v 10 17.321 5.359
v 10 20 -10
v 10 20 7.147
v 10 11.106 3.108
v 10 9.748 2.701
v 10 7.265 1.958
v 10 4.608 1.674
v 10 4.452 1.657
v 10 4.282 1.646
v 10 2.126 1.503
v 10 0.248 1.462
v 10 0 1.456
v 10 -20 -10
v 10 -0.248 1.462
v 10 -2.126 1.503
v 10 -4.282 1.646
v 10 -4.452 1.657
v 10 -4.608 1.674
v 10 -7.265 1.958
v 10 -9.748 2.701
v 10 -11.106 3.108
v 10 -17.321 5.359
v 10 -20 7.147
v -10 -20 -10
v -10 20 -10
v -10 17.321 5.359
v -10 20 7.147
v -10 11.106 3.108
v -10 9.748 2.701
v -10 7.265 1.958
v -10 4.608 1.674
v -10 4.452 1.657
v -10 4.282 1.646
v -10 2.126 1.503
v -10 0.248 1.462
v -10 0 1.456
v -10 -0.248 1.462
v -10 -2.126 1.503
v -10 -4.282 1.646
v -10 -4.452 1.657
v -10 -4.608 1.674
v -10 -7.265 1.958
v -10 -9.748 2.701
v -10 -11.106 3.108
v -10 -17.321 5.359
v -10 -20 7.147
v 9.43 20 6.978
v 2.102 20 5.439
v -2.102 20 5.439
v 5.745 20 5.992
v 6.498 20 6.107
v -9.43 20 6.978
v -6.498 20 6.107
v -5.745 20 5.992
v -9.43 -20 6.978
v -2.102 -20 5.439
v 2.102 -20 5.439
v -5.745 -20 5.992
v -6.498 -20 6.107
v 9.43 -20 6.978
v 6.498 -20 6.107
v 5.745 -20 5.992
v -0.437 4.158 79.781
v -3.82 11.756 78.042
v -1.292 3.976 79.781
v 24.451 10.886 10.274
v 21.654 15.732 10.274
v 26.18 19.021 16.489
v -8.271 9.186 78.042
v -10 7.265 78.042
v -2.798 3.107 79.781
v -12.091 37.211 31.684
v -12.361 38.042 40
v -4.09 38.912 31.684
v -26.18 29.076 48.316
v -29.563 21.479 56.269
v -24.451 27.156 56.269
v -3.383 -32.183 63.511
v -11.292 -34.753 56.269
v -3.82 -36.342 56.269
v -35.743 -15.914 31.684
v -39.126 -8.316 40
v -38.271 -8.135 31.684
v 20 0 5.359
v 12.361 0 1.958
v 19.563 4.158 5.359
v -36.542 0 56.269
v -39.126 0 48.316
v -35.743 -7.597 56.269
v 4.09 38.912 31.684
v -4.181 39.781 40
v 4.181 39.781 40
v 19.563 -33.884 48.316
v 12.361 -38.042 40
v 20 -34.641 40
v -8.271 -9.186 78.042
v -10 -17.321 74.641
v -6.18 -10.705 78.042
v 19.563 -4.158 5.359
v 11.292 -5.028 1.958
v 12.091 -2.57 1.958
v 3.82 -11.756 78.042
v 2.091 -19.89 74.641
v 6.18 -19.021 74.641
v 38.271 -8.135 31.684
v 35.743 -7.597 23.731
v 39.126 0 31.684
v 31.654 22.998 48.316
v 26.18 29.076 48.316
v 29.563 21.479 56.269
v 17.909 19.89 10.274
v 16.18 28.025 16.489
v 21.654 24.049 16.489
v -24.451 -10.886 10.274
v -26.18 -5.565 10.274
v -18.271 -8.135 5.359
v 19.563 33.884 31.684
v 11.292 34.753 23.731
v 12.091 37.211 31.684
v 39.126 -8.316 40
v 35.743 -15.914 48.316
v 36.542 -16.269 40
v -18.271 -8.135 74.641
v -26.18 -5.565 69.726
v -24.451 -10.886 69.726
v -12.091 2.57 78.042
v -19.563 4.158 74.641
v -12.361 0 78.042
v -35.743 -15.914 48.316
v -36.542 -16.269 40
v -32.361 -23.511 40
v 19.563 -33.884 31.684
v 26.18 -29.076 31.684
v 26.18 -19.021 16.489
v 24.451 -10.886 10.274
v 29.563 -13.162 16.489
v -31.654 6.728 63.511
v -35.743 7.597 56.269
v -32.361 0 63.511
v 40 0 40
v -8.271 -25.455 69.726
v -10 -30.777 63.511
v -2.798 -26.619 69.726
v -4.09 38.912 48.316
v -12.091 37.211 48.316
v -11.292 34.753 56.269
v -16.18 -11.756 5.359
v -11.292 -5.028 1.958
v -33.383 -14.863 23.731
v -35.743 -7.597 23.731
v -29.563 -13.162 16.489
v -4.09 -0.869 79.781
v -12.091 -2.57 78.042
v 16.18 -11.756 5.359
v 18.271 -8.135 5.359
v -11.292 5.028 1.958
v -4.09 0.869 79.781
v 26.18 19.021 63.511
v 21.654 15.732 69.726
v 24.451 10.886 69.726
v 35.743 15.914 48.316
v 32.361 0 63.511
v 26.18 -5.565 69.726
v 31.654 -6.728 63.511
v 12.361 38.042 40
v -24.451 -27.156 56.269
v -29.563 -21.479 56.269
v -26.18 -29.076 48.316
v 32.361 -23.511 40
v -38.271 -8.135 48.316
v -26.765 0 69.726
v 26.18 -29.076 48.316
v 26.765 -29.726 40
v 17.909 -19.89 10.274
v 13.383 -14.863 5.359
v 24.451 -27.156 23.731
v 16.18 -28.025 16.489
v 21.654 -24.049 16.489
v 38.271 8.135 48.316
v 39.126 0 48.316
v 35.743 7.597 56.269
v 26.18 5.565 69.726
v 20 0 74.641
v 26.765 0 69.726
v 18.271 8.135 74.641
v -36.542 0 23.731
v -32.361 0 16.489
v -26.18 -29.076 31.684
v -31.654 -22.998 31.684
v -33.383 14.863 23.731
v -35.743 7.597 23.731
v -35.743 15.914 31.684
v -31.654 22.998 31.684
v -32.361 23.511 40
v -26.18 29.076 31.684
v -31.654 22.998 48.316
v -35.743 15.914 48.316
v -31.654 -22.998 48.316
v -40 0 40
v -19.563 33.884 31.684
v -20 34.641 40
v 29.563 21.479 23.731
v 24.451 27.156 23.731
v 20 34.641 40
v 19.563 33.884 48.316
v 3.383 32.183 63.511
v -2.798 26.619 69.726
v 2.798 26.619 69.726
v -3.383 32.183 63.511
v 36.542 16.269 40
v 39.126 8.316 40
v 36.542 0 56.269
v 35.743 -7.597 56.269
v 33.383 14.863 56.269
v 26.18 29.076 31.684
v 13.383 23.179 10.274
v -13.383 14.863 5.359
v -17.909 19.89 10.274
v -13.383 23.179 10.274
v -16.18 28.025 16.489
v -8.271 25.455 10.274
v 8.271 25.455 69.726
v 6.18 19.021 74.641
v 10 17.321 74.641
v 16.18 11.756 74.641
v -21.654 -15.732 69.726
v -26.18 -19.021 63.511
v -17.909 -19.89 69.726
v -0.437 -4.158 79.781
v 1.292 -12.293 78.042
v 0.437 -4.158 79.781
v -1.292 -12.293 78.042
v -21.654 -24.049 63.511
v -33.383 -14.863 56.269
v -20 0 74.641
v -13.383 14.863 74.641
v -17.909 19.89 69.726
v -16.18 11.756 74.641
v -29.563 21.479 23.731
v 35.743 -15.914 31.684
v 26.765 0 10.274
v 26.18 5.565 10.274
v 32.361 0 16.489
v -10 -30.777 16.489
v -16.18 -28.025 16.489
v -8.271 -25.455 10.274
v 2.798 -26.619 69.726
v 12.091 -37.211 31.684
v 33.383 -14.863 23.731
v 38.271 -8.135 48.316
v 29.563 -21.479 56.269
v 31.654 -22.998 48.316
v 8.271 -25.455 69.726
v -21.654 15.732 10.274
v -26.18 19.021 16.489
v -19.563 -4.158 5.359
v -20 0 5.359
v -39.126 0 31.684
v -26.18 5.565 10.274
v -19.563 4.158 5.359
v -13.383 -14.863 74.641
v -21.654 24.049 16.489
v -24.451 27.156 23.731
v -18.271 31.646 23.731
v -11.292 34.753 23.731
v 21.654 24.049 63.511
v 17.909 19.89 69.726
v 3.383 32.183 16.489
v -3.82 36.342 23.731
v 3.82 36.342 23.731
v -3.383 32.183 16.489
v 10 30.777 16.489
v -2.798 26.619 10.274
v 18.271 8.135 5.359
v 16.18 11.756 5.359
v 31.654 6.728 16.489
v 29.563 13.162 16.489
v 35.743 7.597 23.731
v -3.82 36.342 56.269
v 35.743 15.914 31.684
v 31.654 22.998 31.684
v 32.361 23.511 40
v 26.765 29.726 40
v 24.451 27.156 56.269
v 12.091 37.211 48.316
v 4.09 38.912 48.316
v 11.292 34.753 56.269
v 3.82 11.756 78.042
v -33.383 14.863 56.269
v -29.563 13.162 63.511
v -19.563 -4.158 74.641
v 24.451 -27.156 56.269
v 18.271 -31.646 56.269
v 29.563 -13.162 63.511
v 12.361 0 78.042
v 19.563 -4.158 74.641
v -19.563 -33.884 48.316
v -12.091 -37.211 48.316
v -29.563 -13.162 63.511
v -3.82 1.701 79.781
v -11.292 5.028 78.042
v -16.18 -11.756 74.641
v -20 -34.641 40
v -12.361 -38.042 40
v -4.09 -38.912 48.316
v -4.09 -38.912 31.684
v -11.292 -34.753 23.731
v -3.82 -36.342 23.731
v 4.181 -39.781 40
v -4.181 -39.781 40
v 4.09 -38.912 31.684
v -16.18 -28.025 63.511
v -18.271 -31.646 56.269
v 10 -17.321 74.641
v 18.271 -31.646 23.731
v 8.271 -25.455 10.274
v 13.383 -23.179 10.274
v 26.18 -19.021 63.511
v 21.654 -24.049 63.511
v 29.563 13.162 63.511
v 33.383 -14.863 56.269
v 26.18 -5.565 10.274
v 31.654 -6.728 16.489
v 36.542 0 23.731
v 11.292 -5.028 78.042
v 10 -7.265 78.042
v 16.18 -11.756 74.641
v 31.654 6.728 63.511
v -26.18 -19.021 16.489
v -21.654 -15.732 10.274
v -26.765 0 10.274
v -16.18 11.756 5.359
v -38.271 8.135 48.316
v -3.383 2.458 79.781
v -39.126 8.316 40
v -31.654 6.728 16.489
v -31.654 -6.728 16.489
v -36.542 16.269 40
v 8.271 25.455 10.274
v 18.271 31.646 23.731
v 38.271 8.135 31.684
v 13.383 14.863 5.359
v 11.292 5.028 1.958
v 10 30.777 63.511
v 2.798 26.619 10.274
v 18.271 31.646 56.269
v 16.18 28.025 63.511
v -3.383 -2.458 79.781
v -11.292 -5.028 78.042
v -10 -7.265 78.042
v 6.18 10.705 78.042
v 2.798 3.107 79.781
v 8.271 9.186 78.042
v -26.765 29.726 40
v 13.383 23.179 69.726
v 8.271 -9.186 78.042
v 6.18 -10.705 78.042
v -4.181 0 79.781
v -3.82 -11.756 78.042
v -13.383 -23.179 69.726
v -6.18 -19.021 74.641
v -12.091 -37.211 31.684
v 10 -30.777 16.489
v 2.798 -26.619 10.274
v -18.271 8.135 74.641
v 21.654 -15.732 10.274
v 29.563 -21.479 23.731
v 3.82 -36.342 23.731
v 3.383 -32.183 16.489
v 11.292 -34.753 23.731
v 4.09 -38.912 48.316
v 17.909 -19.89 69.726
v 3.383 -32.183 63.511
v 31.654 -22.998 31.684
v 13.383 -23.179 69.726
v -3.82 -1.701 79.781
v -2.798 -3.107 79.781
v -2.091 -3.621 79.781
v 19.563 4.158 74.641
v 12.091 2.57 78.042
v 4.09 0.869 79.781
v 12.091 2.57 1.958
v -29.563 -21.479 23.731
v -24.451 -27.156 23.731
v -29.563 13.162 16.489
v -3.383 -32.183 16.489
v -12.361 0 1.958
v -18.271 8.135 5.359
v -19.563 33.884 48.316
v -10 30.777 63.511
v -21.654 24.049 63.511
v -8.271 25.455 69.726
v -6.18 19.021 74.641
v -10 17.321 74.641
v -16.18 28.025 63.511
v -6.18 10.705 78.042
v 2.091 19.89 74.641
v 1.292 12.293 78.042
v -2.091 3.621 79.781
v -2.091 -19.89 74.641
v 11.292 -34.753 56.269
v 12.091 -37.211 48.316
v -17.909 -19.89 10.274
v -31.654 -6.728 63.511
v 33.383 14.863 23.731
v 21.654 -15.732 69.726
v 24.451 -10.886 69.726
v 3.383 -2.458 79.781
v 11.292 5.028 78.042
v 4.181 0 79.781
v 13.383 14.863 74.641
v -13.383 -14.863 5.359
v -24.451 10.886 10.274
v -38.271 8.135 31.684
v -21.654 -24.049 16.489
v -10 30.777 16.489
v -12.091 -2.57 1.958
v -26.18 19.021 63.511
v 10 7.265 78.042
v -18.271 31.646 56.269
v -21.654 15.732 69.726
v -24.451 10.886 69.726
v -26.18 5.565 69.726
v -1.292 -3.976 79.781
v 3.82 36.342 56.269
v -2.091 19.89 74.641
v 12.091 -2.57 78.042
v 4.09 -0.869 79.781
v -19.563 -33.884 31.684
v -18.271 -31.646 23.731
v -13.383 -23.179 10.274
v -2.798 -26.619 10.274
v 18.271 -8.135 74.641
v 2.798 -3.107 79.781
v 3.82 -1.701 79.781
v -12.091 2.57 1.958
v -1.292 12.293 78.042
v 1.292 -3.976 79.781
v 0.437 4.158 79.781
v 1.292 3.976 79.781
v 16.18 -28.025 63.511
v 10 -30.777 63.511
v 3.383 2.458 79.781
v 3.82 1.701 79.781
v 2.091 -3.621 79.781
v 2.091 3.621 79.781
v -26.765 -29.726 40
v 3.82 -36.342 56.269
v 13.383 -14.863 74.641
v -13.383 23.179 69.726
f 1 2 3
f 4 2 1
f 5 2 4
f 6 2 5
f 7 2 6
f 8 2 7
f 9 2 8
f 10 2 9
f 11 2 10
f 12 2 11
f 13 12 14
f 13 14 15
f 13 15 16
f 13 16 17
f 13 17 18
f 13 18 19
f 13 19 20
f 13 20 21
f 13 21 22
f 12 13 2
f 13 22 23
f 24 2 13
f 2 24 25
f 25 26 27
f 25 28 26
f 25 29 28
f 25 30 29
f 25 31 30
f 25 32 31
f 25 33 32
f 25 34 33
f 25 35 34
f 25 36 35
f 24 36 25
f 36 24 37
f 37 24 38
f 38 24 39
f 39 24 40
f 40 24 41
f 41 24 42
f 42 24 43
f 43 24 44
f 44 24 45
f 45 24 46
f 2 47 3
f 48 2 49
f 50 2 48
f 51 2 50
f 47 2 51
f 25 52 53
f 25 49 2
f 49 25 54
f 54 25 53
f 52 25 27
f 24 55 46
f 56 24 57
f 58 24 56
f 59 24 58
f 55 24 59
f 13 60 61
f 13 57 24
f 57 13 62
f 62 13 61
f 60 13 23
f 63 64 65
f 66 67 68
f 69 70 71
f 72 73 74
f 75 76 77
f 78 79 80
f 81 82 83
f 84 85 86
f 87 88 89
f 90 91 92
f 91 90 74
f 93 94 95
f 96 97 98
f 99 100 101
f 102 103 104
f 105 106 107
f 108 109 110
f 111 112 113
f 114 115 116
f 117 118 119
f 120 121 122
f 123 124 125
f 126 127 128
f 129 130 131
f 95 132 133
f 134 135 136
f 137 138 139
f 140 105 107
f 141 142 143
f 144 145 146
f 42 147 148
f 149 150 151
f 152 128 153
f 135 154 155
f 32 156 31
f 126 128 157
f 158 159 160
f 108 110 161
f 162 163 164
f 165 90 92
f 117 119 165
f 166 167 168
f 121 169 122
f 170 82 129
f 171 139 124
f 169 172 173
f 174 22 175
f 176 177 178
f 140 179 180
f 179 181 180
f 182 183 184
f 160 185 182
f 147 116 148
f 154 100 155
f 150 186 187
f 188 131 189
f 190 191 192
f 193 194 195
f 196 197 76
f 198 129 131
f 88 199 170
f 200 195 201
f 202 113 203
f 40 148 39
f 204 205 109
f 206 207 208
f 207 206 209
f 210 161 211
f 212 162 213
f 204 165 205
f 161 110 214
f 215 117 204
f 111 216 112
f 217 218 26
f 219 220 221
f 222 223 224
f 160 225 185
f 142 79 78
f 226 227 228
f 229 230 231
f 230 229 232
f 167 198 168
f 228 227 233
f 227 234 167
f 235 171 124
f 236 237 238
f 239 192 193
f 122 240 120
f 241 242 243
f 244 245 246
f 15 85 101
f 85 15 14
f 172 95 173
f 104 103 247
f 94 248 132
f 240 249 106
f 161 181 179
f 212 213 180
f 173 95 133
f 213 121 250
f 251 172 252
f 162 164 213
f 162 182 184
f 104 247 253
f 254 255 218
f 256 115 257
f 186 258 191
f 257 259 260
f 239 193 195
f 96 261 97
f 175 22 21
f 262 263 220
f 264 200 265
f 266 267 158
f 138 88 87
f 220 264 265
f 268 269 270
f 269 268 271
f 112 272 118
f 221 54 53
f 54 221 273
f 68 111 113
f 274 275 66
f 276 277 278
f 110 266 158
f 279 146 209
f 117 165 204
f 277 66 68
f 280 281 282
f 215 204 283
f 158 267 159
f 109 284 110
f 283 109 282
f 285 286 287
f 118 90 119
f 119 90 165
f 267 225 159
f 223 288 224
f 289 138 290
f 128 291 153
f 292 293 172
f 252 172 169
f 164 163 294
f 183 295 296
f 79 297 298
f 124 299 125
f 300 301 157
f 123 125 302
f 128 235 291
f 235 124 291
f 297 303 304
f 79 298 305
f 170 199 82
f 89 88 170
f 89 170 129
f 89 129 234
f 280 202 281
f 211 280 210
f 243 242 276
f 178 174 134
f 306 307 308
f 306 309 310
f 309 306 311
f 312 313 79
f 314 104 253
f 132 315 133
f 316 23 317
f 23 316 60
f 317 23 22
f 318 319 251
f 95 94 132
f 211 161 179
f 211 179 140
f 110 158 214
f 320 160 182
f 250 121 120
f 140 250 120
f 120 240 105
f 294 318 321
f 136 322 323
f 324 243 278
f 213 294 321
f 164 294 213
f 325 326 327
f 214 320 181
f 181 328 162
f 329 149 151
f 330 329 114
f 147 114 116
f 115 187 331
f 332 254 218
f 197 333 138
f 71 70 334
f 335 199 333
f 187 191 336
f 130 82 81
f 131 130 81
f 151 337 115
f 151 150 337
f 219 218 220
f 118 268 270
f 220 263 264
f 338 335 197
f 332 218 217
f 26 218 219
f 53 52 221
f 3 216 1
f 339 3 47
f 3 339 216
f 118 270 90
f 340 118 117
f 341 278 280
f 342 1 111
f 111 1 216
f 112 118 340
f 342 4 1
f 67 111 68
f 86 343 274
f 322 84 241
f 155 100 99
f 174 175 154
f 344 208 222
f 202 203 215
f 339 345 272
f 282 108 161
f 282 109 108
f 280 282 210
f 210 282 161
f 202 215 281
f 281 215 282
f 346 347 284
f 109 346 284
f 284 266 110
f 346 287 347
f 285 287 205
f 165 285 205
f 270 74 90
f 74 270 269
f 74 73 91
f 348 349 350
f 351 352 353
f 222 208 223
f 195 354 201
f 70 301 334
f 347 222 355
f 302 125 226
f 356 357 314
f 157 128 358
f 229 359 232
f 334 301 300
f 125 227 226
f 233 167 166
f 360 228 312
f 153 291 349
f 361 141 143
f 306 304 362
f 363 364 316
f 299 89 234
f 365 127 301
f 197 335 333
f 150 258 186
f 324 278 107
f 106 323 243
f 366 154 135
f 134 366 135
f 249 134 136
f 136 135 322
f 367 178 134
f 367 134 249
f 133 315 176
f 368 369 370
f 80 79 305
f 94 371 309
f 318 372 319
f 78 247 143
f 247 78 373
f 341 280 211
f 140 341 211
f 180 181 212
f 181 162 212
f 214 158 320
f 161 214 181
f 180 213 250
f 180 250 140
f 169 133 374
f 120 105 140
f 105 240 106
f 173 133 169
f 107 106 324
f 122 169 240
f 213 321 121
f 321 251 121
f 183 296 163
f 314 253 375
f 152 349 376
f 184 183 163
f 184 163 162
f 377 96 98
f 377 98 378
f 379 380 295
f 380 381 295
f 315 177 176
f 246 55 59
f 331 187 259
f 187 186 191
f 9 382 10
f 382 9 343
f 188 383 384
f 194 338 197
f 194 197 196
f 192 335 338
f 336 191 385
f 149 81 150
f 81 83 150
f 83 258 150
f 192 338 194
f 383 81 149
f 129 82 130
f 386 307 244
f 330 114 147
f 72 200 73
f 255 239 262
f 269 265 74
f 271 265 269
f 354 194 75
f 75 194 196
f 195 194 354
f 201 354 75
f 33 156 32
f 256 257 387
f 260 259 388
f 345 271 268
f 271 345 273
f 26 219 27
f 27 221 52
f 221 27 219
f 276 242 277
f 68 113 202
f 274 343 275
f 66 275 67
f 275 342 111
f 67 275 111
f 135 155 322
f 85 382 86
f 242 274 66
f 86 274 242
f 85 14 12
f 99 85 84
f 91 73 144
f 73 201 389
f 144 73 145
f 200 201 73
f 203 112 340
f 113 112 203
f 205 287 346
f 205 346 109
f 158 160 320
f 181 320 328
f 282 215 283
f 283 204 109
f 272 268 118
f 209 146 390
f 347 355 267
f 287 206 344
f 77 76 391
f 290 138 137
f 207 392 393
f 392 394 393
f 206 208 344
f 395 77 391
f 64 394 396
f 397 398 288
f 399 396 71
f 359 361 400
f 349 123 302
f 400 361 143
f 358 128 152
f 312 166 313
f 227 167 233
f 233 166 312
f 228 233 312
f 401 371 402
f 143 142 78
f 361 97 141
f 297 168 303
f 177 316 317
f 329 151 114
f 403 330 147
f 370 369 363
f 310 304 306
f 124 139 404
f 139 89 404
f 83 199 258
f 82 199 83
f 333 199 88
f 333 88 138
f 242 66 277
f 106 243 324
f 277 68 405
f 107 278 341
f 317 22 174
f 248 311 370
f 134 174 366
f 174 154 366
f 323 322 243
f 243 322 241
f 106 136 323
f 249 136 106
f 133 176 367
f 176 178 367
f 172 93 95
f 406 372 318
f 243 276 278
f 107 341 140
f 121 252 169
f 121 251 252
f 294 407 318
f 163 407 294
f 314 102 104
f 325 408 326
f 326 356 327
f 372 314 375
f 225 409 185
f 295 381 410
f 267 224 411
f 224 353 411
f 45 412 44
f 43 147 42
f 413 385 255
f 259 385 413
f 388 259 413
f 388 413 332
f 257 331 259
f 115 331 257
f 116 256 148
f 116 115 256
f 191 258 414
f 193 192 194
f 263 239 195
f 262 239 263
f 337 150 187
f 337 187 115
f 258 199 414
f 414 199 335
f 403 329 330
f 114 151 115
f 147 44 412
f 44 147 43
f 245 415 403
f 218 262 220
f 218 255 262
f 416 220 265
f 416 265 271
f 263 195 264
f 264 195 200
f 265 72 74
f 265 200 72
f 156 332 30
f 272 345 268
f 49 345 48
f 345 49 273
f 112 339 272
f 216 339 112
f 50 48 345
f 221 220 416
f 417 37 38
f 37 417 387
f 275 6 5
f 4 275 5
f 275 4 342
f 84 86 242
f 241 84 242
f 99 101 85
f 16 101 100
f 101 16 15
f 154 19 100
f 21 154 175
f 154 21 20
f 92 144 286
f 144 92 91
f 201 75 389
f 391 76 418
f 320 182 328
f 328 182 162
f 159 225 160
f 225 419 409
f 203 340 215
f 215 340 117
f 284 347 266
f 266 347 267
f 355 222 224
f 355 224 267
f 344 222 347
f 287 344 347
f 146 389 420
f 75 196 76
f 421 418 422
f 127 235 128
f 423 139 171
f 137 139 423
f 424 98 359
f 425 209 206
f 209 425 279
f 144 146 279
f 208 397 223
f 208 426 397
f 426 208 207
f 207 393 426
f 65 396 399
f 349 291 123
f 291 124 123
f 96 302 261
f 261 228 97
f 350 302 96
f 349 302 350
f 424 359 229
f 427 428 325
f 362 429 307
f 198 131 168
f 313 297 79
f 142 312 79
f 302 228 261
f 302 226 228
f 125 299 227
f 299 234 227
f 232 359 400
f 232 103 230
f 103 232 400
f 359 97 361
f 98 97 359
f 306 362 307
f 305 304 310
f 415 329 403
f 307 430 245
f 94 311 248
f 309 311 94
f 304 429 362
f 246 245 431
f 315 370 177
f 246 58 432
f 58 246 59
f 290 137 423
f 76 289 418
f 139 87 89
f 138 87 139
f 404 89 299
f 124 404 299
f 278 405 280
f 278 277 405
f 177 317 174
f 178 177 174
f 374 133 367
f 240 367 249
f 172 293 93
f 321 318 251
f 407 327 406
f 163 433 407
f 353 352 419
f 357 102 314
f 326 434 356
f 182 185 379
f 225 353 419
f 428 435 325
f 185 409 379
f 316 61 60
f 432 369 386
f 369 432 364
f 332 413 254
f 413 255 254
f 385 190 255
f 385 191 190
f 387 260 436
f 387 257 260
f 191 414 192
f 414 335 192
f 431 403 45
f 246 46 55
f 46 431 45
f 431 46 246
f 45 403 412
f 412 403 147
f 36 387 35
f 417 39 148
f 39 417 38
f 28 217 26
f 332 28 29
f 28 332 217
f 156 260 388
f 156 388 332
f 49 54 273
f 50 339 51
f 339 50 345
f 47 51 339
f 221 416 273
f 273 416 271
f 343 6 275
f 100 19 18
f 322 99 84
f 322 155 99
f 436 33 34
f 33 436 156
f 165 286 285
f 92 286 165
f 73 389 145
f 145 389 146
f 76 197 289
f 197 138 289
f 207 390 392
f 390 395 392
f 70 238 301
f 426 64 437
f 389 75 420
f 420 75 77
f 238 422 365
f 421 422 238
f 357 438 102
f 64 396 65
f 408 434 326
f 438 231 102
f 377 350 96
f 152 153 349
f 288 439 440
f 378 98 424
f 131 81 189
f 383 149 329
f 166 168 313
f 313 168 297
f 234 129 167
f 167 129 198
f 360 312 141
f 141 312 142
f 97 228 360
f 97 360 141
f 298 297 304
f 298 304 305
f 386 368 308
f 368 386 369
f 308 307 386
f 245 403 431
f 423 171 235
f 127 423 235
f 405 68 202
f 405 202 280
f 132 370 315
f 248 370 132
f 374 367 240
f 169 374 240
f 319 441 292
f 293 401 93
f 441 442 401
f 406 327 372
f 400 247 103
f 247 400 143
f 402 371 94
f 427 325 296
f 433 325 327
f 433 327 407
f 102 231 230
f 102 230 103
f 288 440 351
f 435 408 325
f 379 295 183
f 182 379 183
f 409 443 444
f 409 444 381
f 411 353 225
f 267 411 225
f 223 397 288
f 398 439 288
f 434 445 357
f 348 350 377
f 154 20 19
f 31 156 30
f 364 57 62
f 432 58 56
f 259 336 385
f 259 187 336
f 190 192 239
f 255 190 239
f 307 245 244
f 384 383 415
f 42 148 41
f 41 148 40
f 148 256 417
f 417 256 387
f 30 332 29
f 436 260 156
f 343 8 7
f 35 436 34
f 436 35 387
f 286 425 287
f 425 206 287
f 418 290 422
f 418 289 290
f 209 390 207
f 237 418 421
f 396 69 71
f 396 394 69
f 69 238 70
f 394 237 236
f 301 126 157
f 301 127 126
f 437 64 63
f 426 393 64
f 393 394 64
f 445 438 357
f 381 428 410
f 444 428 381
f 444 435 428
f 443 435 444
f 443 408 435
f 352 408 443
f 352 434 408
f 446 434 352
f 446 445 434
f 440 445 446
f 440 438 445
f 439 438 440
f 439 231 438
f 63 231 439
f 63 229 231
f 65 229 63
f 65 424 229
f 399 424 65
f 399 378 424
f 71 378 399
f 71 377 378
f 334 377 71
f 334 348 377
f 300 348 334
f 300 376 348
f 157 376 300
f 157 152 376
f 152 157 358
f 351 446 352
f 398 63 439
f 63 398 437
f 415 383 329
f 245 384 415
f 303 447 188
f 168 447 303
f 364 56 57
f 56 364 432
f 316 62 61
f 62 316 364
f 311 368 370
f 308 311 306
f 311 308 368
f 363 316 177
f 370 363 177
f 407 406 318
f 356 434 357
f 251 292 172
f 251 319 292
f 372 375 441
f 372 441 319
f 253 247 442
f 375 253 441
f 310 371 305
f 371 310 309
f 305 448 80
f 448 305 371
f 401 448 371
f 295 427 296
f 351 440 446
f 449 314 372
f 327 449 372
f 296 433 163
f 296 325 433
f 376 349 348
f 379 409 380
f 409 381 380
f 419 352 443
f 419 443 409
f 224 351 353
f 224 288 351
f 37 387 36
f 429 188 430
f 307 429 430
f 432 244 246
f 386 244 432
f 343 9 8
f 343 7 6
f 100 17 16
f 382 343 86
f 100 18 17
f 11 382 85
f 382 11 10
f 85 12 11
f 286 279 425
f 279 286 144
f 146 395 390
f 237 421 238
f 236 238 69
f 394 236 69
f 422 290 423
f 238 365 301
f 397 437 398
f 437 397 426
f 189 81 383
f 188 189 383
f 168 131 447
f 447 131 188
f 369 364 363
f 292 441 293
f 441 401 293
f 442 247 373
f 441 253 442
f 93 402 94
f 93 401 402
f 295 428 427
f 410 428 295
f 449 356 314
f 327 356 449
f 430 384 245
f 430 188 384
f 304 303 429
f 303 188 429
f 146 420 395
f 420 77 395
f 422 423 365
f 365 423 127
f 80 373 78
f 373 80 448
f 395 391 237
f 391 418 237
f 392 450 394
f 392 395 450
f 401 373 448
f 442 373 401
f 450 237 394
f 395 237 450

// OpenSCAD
cube([20,40,20], center=true);
translate([0,0, 40]) sphere(40);
